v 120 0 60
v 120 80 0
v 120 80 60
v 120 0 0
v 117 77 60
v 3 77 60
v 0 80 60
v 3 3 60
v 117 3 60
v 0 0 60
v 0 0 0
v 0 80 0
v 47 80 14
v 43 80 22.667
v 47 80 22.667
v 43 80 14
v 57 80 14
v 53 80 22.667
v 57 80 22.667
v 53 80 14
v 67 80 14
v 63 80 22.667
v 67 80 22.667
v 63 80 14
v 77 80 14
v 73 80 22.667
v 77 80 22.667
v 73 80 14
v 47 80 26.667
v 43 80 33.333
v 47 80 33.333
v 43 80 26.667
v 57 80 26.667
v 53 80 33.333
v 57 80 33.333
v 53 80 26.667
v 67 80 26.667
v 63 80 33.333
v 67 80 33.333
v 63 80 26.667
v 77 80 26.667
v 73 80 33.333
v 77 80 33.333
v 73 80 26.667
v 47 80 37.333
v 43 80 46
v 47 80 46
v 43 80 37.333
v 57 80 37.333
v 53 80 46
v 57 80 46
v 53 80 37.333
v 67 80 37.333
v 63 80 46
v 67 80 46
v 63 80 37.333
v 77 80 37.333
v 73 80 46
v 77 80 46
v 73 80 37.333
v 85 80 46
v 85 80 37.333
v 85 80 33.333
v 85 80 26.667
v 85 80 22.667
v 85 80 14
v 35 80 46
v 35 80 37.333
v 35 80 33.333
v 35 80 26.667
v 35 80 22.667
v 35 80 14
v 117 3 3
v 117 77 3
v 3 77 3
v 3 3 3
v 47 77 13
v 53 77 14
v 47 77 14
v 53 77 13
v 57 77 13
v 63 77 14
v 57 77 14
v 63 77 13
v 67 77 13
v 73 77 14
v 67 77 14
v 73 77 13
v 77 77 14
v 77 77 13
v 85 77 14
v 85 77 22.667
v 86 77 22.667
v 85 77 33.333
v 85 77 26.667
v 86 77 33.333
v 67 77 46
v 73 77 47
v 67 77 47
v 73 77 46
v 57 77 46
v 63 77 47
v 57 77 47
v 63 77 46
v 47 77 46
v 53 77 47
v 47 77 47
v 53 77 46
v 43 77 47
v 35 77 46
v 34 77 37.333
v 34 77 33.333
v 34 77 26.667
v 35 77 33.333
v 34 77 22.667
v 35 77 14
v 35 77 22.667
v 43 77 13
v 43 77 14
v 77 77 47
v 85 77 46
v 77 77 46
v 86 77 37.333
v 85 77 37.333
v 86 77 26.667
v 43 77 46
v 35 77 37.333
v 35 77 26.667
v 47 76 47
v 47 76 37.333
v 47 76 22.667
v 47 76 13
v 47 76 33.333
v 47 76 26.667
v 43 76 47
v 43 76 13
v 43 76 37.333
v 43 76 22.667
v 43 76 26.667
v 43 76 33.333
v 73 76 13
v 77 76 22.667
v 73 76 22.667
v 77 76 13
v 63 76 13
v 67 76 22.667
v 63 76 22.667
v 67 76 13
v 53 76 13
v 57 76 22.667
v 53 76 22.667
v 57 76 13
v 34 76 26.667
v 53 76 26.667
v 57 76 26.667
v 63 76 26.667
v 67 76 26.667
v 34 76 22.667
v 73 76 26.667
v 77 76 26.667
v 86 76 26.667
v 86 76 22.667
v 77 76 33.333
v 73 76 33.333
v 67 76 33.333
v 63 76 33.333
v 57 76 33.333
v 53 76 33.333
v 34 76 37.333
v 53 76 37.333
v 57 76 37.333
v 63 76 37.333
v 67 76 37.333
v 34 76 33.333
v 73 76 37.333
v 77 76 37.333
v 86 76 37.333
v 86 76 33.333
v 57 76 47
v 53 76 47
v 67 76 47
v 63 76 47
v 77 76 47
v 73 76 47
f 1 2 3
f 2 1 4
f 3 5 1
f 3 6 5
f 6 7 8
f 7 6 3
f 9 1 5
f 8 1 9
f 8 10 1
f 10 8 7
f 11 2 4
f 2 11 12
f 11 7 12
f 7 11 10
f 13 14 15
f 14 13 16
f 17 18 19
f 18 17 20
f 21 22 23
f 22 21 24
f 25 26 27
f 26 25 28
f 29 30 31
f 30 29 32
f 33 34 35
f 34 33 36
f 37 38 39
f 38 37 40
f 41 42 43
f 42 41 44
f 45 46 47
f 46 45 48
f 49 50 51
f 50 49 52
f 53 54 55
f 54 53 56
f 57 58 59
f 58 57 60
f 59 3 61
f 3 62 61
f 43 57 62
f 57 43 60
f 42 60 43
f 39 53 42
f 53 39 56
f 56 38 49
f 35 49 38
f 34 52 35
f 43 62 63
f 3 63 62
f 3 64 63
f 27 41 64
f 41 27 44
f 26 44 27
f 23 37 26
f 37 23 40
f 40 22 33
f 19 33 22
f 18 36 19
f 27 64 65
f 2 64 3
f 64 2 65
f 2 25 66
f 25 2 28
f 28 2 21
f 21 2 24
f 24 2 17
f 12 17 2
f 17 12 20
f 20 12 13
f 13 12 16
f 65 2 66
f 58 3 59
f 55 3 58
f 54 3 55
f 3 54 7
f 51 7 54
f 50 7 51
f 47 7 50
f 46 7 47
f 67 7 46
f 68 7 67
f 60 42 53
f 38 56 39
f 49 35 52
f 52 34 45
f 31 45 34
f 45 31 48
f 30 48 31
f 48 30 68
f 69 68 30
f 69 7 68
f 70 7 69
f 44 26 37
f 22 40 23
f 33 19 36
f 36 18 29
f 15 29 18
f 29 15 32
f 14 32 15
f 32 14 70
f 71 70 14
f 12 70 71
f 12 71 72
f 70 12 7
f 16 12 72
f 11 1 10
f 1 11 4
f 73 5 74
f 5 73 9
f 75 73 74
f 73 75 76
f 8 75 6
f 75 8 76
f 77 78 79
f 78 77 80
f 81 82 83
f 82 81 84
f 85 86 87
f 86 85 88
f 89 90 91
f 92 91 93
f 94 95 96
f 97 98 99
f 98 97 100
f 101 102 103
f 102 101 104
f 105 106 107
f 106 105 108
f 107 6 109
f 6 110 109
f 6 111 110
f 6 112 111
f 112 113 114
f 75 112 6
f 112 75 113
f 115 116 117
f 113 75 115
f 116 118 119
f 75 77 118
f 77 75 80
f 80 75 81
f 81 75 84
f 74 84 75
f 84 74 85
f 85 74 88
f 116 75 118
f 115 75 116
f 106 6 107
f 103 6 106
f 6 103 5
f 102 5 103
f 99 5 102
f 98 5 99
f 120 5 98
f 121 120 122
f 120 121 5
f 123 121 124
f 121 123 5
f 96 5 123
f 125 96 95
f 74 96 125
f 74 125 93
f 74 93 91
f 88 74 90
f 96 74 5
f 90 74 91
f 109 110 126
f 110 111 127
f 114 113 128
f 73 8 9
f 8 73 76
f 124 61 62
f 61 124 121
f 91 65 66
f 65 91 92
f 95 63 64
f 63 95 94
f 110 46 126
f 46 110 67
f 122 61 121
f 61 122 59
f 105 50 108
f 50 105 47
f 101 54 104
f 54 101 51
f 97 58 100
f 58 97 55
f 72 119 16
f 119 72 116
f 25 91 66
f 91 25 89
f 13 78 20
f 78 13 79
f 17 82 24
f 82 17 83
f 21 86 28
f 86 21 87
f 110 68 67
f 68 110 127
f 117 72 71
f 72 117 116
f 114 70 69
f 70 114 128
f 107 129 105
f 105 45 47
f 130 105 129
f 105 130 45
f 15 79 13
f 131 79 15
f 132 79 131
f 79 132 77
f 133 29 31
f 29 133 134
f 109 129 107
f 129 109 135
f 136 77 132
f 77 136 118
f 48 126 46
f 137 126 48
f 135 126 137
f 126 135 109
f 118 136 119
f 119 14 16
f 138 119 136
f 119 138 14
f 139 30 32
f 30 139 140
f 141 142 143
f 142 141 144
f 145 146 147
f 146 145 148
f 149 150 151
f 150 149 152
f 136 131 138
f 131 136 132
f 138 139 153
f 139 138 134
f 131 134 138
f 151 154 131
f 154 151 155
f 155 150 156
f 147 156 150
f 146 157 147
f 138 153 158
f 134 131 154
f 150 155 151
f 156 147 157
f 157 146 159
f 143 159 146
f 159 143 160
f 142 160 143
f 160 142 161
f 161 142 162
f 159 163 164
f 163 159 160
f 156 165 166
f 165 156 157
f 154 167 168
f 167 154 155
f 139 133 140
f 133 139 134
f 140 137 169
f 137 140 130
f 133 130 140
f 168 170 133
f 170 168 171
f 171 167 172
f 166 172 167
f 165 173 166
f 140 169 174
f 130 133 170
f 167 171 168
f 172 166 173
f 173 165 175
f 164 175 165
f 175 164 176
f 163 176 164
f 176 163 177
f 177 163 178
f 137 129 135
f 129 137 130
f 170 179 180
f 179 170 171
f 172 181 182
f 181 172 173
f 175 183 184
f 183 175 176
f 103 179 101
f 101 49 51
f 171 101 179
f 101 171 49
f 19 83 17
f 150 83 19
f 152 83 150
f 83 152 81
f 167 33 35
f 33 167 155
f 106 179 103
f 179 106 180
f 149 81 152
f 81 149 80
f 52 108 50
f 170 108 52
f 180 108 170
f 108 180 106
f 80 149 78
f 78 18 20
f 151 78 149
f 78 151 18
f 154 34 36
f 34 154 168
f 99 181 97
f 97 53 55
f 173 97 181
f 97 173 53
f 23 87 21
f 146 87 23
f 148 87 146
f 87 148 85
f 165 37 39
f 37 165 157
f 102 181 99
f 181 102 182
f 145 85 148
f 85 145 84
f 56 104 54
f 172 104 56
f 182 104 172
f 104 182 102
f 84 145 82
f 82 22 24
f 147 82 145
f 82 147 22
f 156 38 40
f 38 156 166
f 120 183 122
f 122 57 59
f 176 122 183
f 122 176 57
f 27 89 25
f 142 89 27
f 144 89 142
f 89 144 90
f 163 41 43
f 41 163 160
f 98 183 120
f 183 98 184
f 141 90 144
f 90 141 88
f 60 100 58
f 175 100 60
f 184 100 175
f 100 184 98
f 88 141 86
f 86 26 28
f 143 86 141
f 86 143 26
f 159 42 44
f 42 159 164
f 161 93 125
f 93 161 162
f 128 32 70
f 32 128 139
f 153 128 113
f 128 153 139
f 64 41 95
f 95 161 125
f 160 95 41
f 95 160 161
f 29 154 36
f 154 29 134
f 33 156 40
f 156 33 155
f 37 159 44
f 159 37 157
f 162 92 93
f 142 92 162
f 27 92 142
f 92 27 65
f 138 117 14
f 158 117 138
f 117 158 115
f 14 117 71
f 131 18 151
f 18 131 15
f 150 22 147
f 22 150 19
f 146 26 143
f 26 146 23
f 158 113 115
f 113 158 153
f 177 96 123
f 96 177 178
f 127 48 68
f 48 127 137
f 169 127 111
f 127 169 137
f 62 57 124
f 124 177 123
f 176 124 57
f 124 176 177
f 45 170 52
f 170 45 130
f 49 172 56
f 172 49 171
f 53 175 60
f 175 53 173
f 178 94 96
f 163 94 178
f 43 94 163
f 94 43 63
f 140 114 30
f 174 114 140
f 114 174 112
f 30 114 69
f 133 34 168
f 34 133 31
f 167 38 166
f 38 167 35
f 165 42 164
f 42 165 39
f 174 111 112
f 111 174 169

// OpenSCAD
$fn = 32;

// ----------------------------------------------------------------------
// Vent box: crossgrid enclosure
// ----------------------------------------------------------------------

// --- parameters (mm) ---
box_l = 120;              // box length, X
box_w = 80;               // box width, Y
box_h = 60;               // box height, Z
wall_t = 3;               // shell wall thickness
win_l = 50;               // vent window width, X
win_h = 32;               // vent window height, Z
bar_w = 4;                // grid bar width
n_v = 4;                  // vertical bar count
n_h = 2;                  // horizontal bar count

win_z0 = (box_h - win_h) / 2;  // window lower edge Z
v_step = win_l / (n_v + 1);  // vertical bar step
h_step = win_h / (n_h + 1);  // horizontal bar step

difference() {
  union() {
    difference() {
      cube([box_l, box_w, box_h]);
  translate([wall_t, wall_t, wall_t])
    cube([box_l - 2 * wall_t, box_w - 2 * wall_t, box_h]);
  translate([(box_l - win_l) / 2, box_w - wall_t - 1, win_z0])
    cube([win_l, wall_t + 2, win_h]);
    }
    for (i = [1 : n_v])
      translate([(box_l - win_l) / 2 + i * v_step - bar_w / 2,
                 box_w - wall_t - 1, win_z0 - 1])
        cube([bar_w, wall_t + 1, win_h + 2]);
    for (i = [1 : n_h])
      translate([(box_l - win_l) / 2 - 1, box_w - wall_t - 1,
                 win_z0 + i * h_step - bar_w / 2])
        cube([win_l + 2, wall_t + 1, bar_w]);
  }
}
